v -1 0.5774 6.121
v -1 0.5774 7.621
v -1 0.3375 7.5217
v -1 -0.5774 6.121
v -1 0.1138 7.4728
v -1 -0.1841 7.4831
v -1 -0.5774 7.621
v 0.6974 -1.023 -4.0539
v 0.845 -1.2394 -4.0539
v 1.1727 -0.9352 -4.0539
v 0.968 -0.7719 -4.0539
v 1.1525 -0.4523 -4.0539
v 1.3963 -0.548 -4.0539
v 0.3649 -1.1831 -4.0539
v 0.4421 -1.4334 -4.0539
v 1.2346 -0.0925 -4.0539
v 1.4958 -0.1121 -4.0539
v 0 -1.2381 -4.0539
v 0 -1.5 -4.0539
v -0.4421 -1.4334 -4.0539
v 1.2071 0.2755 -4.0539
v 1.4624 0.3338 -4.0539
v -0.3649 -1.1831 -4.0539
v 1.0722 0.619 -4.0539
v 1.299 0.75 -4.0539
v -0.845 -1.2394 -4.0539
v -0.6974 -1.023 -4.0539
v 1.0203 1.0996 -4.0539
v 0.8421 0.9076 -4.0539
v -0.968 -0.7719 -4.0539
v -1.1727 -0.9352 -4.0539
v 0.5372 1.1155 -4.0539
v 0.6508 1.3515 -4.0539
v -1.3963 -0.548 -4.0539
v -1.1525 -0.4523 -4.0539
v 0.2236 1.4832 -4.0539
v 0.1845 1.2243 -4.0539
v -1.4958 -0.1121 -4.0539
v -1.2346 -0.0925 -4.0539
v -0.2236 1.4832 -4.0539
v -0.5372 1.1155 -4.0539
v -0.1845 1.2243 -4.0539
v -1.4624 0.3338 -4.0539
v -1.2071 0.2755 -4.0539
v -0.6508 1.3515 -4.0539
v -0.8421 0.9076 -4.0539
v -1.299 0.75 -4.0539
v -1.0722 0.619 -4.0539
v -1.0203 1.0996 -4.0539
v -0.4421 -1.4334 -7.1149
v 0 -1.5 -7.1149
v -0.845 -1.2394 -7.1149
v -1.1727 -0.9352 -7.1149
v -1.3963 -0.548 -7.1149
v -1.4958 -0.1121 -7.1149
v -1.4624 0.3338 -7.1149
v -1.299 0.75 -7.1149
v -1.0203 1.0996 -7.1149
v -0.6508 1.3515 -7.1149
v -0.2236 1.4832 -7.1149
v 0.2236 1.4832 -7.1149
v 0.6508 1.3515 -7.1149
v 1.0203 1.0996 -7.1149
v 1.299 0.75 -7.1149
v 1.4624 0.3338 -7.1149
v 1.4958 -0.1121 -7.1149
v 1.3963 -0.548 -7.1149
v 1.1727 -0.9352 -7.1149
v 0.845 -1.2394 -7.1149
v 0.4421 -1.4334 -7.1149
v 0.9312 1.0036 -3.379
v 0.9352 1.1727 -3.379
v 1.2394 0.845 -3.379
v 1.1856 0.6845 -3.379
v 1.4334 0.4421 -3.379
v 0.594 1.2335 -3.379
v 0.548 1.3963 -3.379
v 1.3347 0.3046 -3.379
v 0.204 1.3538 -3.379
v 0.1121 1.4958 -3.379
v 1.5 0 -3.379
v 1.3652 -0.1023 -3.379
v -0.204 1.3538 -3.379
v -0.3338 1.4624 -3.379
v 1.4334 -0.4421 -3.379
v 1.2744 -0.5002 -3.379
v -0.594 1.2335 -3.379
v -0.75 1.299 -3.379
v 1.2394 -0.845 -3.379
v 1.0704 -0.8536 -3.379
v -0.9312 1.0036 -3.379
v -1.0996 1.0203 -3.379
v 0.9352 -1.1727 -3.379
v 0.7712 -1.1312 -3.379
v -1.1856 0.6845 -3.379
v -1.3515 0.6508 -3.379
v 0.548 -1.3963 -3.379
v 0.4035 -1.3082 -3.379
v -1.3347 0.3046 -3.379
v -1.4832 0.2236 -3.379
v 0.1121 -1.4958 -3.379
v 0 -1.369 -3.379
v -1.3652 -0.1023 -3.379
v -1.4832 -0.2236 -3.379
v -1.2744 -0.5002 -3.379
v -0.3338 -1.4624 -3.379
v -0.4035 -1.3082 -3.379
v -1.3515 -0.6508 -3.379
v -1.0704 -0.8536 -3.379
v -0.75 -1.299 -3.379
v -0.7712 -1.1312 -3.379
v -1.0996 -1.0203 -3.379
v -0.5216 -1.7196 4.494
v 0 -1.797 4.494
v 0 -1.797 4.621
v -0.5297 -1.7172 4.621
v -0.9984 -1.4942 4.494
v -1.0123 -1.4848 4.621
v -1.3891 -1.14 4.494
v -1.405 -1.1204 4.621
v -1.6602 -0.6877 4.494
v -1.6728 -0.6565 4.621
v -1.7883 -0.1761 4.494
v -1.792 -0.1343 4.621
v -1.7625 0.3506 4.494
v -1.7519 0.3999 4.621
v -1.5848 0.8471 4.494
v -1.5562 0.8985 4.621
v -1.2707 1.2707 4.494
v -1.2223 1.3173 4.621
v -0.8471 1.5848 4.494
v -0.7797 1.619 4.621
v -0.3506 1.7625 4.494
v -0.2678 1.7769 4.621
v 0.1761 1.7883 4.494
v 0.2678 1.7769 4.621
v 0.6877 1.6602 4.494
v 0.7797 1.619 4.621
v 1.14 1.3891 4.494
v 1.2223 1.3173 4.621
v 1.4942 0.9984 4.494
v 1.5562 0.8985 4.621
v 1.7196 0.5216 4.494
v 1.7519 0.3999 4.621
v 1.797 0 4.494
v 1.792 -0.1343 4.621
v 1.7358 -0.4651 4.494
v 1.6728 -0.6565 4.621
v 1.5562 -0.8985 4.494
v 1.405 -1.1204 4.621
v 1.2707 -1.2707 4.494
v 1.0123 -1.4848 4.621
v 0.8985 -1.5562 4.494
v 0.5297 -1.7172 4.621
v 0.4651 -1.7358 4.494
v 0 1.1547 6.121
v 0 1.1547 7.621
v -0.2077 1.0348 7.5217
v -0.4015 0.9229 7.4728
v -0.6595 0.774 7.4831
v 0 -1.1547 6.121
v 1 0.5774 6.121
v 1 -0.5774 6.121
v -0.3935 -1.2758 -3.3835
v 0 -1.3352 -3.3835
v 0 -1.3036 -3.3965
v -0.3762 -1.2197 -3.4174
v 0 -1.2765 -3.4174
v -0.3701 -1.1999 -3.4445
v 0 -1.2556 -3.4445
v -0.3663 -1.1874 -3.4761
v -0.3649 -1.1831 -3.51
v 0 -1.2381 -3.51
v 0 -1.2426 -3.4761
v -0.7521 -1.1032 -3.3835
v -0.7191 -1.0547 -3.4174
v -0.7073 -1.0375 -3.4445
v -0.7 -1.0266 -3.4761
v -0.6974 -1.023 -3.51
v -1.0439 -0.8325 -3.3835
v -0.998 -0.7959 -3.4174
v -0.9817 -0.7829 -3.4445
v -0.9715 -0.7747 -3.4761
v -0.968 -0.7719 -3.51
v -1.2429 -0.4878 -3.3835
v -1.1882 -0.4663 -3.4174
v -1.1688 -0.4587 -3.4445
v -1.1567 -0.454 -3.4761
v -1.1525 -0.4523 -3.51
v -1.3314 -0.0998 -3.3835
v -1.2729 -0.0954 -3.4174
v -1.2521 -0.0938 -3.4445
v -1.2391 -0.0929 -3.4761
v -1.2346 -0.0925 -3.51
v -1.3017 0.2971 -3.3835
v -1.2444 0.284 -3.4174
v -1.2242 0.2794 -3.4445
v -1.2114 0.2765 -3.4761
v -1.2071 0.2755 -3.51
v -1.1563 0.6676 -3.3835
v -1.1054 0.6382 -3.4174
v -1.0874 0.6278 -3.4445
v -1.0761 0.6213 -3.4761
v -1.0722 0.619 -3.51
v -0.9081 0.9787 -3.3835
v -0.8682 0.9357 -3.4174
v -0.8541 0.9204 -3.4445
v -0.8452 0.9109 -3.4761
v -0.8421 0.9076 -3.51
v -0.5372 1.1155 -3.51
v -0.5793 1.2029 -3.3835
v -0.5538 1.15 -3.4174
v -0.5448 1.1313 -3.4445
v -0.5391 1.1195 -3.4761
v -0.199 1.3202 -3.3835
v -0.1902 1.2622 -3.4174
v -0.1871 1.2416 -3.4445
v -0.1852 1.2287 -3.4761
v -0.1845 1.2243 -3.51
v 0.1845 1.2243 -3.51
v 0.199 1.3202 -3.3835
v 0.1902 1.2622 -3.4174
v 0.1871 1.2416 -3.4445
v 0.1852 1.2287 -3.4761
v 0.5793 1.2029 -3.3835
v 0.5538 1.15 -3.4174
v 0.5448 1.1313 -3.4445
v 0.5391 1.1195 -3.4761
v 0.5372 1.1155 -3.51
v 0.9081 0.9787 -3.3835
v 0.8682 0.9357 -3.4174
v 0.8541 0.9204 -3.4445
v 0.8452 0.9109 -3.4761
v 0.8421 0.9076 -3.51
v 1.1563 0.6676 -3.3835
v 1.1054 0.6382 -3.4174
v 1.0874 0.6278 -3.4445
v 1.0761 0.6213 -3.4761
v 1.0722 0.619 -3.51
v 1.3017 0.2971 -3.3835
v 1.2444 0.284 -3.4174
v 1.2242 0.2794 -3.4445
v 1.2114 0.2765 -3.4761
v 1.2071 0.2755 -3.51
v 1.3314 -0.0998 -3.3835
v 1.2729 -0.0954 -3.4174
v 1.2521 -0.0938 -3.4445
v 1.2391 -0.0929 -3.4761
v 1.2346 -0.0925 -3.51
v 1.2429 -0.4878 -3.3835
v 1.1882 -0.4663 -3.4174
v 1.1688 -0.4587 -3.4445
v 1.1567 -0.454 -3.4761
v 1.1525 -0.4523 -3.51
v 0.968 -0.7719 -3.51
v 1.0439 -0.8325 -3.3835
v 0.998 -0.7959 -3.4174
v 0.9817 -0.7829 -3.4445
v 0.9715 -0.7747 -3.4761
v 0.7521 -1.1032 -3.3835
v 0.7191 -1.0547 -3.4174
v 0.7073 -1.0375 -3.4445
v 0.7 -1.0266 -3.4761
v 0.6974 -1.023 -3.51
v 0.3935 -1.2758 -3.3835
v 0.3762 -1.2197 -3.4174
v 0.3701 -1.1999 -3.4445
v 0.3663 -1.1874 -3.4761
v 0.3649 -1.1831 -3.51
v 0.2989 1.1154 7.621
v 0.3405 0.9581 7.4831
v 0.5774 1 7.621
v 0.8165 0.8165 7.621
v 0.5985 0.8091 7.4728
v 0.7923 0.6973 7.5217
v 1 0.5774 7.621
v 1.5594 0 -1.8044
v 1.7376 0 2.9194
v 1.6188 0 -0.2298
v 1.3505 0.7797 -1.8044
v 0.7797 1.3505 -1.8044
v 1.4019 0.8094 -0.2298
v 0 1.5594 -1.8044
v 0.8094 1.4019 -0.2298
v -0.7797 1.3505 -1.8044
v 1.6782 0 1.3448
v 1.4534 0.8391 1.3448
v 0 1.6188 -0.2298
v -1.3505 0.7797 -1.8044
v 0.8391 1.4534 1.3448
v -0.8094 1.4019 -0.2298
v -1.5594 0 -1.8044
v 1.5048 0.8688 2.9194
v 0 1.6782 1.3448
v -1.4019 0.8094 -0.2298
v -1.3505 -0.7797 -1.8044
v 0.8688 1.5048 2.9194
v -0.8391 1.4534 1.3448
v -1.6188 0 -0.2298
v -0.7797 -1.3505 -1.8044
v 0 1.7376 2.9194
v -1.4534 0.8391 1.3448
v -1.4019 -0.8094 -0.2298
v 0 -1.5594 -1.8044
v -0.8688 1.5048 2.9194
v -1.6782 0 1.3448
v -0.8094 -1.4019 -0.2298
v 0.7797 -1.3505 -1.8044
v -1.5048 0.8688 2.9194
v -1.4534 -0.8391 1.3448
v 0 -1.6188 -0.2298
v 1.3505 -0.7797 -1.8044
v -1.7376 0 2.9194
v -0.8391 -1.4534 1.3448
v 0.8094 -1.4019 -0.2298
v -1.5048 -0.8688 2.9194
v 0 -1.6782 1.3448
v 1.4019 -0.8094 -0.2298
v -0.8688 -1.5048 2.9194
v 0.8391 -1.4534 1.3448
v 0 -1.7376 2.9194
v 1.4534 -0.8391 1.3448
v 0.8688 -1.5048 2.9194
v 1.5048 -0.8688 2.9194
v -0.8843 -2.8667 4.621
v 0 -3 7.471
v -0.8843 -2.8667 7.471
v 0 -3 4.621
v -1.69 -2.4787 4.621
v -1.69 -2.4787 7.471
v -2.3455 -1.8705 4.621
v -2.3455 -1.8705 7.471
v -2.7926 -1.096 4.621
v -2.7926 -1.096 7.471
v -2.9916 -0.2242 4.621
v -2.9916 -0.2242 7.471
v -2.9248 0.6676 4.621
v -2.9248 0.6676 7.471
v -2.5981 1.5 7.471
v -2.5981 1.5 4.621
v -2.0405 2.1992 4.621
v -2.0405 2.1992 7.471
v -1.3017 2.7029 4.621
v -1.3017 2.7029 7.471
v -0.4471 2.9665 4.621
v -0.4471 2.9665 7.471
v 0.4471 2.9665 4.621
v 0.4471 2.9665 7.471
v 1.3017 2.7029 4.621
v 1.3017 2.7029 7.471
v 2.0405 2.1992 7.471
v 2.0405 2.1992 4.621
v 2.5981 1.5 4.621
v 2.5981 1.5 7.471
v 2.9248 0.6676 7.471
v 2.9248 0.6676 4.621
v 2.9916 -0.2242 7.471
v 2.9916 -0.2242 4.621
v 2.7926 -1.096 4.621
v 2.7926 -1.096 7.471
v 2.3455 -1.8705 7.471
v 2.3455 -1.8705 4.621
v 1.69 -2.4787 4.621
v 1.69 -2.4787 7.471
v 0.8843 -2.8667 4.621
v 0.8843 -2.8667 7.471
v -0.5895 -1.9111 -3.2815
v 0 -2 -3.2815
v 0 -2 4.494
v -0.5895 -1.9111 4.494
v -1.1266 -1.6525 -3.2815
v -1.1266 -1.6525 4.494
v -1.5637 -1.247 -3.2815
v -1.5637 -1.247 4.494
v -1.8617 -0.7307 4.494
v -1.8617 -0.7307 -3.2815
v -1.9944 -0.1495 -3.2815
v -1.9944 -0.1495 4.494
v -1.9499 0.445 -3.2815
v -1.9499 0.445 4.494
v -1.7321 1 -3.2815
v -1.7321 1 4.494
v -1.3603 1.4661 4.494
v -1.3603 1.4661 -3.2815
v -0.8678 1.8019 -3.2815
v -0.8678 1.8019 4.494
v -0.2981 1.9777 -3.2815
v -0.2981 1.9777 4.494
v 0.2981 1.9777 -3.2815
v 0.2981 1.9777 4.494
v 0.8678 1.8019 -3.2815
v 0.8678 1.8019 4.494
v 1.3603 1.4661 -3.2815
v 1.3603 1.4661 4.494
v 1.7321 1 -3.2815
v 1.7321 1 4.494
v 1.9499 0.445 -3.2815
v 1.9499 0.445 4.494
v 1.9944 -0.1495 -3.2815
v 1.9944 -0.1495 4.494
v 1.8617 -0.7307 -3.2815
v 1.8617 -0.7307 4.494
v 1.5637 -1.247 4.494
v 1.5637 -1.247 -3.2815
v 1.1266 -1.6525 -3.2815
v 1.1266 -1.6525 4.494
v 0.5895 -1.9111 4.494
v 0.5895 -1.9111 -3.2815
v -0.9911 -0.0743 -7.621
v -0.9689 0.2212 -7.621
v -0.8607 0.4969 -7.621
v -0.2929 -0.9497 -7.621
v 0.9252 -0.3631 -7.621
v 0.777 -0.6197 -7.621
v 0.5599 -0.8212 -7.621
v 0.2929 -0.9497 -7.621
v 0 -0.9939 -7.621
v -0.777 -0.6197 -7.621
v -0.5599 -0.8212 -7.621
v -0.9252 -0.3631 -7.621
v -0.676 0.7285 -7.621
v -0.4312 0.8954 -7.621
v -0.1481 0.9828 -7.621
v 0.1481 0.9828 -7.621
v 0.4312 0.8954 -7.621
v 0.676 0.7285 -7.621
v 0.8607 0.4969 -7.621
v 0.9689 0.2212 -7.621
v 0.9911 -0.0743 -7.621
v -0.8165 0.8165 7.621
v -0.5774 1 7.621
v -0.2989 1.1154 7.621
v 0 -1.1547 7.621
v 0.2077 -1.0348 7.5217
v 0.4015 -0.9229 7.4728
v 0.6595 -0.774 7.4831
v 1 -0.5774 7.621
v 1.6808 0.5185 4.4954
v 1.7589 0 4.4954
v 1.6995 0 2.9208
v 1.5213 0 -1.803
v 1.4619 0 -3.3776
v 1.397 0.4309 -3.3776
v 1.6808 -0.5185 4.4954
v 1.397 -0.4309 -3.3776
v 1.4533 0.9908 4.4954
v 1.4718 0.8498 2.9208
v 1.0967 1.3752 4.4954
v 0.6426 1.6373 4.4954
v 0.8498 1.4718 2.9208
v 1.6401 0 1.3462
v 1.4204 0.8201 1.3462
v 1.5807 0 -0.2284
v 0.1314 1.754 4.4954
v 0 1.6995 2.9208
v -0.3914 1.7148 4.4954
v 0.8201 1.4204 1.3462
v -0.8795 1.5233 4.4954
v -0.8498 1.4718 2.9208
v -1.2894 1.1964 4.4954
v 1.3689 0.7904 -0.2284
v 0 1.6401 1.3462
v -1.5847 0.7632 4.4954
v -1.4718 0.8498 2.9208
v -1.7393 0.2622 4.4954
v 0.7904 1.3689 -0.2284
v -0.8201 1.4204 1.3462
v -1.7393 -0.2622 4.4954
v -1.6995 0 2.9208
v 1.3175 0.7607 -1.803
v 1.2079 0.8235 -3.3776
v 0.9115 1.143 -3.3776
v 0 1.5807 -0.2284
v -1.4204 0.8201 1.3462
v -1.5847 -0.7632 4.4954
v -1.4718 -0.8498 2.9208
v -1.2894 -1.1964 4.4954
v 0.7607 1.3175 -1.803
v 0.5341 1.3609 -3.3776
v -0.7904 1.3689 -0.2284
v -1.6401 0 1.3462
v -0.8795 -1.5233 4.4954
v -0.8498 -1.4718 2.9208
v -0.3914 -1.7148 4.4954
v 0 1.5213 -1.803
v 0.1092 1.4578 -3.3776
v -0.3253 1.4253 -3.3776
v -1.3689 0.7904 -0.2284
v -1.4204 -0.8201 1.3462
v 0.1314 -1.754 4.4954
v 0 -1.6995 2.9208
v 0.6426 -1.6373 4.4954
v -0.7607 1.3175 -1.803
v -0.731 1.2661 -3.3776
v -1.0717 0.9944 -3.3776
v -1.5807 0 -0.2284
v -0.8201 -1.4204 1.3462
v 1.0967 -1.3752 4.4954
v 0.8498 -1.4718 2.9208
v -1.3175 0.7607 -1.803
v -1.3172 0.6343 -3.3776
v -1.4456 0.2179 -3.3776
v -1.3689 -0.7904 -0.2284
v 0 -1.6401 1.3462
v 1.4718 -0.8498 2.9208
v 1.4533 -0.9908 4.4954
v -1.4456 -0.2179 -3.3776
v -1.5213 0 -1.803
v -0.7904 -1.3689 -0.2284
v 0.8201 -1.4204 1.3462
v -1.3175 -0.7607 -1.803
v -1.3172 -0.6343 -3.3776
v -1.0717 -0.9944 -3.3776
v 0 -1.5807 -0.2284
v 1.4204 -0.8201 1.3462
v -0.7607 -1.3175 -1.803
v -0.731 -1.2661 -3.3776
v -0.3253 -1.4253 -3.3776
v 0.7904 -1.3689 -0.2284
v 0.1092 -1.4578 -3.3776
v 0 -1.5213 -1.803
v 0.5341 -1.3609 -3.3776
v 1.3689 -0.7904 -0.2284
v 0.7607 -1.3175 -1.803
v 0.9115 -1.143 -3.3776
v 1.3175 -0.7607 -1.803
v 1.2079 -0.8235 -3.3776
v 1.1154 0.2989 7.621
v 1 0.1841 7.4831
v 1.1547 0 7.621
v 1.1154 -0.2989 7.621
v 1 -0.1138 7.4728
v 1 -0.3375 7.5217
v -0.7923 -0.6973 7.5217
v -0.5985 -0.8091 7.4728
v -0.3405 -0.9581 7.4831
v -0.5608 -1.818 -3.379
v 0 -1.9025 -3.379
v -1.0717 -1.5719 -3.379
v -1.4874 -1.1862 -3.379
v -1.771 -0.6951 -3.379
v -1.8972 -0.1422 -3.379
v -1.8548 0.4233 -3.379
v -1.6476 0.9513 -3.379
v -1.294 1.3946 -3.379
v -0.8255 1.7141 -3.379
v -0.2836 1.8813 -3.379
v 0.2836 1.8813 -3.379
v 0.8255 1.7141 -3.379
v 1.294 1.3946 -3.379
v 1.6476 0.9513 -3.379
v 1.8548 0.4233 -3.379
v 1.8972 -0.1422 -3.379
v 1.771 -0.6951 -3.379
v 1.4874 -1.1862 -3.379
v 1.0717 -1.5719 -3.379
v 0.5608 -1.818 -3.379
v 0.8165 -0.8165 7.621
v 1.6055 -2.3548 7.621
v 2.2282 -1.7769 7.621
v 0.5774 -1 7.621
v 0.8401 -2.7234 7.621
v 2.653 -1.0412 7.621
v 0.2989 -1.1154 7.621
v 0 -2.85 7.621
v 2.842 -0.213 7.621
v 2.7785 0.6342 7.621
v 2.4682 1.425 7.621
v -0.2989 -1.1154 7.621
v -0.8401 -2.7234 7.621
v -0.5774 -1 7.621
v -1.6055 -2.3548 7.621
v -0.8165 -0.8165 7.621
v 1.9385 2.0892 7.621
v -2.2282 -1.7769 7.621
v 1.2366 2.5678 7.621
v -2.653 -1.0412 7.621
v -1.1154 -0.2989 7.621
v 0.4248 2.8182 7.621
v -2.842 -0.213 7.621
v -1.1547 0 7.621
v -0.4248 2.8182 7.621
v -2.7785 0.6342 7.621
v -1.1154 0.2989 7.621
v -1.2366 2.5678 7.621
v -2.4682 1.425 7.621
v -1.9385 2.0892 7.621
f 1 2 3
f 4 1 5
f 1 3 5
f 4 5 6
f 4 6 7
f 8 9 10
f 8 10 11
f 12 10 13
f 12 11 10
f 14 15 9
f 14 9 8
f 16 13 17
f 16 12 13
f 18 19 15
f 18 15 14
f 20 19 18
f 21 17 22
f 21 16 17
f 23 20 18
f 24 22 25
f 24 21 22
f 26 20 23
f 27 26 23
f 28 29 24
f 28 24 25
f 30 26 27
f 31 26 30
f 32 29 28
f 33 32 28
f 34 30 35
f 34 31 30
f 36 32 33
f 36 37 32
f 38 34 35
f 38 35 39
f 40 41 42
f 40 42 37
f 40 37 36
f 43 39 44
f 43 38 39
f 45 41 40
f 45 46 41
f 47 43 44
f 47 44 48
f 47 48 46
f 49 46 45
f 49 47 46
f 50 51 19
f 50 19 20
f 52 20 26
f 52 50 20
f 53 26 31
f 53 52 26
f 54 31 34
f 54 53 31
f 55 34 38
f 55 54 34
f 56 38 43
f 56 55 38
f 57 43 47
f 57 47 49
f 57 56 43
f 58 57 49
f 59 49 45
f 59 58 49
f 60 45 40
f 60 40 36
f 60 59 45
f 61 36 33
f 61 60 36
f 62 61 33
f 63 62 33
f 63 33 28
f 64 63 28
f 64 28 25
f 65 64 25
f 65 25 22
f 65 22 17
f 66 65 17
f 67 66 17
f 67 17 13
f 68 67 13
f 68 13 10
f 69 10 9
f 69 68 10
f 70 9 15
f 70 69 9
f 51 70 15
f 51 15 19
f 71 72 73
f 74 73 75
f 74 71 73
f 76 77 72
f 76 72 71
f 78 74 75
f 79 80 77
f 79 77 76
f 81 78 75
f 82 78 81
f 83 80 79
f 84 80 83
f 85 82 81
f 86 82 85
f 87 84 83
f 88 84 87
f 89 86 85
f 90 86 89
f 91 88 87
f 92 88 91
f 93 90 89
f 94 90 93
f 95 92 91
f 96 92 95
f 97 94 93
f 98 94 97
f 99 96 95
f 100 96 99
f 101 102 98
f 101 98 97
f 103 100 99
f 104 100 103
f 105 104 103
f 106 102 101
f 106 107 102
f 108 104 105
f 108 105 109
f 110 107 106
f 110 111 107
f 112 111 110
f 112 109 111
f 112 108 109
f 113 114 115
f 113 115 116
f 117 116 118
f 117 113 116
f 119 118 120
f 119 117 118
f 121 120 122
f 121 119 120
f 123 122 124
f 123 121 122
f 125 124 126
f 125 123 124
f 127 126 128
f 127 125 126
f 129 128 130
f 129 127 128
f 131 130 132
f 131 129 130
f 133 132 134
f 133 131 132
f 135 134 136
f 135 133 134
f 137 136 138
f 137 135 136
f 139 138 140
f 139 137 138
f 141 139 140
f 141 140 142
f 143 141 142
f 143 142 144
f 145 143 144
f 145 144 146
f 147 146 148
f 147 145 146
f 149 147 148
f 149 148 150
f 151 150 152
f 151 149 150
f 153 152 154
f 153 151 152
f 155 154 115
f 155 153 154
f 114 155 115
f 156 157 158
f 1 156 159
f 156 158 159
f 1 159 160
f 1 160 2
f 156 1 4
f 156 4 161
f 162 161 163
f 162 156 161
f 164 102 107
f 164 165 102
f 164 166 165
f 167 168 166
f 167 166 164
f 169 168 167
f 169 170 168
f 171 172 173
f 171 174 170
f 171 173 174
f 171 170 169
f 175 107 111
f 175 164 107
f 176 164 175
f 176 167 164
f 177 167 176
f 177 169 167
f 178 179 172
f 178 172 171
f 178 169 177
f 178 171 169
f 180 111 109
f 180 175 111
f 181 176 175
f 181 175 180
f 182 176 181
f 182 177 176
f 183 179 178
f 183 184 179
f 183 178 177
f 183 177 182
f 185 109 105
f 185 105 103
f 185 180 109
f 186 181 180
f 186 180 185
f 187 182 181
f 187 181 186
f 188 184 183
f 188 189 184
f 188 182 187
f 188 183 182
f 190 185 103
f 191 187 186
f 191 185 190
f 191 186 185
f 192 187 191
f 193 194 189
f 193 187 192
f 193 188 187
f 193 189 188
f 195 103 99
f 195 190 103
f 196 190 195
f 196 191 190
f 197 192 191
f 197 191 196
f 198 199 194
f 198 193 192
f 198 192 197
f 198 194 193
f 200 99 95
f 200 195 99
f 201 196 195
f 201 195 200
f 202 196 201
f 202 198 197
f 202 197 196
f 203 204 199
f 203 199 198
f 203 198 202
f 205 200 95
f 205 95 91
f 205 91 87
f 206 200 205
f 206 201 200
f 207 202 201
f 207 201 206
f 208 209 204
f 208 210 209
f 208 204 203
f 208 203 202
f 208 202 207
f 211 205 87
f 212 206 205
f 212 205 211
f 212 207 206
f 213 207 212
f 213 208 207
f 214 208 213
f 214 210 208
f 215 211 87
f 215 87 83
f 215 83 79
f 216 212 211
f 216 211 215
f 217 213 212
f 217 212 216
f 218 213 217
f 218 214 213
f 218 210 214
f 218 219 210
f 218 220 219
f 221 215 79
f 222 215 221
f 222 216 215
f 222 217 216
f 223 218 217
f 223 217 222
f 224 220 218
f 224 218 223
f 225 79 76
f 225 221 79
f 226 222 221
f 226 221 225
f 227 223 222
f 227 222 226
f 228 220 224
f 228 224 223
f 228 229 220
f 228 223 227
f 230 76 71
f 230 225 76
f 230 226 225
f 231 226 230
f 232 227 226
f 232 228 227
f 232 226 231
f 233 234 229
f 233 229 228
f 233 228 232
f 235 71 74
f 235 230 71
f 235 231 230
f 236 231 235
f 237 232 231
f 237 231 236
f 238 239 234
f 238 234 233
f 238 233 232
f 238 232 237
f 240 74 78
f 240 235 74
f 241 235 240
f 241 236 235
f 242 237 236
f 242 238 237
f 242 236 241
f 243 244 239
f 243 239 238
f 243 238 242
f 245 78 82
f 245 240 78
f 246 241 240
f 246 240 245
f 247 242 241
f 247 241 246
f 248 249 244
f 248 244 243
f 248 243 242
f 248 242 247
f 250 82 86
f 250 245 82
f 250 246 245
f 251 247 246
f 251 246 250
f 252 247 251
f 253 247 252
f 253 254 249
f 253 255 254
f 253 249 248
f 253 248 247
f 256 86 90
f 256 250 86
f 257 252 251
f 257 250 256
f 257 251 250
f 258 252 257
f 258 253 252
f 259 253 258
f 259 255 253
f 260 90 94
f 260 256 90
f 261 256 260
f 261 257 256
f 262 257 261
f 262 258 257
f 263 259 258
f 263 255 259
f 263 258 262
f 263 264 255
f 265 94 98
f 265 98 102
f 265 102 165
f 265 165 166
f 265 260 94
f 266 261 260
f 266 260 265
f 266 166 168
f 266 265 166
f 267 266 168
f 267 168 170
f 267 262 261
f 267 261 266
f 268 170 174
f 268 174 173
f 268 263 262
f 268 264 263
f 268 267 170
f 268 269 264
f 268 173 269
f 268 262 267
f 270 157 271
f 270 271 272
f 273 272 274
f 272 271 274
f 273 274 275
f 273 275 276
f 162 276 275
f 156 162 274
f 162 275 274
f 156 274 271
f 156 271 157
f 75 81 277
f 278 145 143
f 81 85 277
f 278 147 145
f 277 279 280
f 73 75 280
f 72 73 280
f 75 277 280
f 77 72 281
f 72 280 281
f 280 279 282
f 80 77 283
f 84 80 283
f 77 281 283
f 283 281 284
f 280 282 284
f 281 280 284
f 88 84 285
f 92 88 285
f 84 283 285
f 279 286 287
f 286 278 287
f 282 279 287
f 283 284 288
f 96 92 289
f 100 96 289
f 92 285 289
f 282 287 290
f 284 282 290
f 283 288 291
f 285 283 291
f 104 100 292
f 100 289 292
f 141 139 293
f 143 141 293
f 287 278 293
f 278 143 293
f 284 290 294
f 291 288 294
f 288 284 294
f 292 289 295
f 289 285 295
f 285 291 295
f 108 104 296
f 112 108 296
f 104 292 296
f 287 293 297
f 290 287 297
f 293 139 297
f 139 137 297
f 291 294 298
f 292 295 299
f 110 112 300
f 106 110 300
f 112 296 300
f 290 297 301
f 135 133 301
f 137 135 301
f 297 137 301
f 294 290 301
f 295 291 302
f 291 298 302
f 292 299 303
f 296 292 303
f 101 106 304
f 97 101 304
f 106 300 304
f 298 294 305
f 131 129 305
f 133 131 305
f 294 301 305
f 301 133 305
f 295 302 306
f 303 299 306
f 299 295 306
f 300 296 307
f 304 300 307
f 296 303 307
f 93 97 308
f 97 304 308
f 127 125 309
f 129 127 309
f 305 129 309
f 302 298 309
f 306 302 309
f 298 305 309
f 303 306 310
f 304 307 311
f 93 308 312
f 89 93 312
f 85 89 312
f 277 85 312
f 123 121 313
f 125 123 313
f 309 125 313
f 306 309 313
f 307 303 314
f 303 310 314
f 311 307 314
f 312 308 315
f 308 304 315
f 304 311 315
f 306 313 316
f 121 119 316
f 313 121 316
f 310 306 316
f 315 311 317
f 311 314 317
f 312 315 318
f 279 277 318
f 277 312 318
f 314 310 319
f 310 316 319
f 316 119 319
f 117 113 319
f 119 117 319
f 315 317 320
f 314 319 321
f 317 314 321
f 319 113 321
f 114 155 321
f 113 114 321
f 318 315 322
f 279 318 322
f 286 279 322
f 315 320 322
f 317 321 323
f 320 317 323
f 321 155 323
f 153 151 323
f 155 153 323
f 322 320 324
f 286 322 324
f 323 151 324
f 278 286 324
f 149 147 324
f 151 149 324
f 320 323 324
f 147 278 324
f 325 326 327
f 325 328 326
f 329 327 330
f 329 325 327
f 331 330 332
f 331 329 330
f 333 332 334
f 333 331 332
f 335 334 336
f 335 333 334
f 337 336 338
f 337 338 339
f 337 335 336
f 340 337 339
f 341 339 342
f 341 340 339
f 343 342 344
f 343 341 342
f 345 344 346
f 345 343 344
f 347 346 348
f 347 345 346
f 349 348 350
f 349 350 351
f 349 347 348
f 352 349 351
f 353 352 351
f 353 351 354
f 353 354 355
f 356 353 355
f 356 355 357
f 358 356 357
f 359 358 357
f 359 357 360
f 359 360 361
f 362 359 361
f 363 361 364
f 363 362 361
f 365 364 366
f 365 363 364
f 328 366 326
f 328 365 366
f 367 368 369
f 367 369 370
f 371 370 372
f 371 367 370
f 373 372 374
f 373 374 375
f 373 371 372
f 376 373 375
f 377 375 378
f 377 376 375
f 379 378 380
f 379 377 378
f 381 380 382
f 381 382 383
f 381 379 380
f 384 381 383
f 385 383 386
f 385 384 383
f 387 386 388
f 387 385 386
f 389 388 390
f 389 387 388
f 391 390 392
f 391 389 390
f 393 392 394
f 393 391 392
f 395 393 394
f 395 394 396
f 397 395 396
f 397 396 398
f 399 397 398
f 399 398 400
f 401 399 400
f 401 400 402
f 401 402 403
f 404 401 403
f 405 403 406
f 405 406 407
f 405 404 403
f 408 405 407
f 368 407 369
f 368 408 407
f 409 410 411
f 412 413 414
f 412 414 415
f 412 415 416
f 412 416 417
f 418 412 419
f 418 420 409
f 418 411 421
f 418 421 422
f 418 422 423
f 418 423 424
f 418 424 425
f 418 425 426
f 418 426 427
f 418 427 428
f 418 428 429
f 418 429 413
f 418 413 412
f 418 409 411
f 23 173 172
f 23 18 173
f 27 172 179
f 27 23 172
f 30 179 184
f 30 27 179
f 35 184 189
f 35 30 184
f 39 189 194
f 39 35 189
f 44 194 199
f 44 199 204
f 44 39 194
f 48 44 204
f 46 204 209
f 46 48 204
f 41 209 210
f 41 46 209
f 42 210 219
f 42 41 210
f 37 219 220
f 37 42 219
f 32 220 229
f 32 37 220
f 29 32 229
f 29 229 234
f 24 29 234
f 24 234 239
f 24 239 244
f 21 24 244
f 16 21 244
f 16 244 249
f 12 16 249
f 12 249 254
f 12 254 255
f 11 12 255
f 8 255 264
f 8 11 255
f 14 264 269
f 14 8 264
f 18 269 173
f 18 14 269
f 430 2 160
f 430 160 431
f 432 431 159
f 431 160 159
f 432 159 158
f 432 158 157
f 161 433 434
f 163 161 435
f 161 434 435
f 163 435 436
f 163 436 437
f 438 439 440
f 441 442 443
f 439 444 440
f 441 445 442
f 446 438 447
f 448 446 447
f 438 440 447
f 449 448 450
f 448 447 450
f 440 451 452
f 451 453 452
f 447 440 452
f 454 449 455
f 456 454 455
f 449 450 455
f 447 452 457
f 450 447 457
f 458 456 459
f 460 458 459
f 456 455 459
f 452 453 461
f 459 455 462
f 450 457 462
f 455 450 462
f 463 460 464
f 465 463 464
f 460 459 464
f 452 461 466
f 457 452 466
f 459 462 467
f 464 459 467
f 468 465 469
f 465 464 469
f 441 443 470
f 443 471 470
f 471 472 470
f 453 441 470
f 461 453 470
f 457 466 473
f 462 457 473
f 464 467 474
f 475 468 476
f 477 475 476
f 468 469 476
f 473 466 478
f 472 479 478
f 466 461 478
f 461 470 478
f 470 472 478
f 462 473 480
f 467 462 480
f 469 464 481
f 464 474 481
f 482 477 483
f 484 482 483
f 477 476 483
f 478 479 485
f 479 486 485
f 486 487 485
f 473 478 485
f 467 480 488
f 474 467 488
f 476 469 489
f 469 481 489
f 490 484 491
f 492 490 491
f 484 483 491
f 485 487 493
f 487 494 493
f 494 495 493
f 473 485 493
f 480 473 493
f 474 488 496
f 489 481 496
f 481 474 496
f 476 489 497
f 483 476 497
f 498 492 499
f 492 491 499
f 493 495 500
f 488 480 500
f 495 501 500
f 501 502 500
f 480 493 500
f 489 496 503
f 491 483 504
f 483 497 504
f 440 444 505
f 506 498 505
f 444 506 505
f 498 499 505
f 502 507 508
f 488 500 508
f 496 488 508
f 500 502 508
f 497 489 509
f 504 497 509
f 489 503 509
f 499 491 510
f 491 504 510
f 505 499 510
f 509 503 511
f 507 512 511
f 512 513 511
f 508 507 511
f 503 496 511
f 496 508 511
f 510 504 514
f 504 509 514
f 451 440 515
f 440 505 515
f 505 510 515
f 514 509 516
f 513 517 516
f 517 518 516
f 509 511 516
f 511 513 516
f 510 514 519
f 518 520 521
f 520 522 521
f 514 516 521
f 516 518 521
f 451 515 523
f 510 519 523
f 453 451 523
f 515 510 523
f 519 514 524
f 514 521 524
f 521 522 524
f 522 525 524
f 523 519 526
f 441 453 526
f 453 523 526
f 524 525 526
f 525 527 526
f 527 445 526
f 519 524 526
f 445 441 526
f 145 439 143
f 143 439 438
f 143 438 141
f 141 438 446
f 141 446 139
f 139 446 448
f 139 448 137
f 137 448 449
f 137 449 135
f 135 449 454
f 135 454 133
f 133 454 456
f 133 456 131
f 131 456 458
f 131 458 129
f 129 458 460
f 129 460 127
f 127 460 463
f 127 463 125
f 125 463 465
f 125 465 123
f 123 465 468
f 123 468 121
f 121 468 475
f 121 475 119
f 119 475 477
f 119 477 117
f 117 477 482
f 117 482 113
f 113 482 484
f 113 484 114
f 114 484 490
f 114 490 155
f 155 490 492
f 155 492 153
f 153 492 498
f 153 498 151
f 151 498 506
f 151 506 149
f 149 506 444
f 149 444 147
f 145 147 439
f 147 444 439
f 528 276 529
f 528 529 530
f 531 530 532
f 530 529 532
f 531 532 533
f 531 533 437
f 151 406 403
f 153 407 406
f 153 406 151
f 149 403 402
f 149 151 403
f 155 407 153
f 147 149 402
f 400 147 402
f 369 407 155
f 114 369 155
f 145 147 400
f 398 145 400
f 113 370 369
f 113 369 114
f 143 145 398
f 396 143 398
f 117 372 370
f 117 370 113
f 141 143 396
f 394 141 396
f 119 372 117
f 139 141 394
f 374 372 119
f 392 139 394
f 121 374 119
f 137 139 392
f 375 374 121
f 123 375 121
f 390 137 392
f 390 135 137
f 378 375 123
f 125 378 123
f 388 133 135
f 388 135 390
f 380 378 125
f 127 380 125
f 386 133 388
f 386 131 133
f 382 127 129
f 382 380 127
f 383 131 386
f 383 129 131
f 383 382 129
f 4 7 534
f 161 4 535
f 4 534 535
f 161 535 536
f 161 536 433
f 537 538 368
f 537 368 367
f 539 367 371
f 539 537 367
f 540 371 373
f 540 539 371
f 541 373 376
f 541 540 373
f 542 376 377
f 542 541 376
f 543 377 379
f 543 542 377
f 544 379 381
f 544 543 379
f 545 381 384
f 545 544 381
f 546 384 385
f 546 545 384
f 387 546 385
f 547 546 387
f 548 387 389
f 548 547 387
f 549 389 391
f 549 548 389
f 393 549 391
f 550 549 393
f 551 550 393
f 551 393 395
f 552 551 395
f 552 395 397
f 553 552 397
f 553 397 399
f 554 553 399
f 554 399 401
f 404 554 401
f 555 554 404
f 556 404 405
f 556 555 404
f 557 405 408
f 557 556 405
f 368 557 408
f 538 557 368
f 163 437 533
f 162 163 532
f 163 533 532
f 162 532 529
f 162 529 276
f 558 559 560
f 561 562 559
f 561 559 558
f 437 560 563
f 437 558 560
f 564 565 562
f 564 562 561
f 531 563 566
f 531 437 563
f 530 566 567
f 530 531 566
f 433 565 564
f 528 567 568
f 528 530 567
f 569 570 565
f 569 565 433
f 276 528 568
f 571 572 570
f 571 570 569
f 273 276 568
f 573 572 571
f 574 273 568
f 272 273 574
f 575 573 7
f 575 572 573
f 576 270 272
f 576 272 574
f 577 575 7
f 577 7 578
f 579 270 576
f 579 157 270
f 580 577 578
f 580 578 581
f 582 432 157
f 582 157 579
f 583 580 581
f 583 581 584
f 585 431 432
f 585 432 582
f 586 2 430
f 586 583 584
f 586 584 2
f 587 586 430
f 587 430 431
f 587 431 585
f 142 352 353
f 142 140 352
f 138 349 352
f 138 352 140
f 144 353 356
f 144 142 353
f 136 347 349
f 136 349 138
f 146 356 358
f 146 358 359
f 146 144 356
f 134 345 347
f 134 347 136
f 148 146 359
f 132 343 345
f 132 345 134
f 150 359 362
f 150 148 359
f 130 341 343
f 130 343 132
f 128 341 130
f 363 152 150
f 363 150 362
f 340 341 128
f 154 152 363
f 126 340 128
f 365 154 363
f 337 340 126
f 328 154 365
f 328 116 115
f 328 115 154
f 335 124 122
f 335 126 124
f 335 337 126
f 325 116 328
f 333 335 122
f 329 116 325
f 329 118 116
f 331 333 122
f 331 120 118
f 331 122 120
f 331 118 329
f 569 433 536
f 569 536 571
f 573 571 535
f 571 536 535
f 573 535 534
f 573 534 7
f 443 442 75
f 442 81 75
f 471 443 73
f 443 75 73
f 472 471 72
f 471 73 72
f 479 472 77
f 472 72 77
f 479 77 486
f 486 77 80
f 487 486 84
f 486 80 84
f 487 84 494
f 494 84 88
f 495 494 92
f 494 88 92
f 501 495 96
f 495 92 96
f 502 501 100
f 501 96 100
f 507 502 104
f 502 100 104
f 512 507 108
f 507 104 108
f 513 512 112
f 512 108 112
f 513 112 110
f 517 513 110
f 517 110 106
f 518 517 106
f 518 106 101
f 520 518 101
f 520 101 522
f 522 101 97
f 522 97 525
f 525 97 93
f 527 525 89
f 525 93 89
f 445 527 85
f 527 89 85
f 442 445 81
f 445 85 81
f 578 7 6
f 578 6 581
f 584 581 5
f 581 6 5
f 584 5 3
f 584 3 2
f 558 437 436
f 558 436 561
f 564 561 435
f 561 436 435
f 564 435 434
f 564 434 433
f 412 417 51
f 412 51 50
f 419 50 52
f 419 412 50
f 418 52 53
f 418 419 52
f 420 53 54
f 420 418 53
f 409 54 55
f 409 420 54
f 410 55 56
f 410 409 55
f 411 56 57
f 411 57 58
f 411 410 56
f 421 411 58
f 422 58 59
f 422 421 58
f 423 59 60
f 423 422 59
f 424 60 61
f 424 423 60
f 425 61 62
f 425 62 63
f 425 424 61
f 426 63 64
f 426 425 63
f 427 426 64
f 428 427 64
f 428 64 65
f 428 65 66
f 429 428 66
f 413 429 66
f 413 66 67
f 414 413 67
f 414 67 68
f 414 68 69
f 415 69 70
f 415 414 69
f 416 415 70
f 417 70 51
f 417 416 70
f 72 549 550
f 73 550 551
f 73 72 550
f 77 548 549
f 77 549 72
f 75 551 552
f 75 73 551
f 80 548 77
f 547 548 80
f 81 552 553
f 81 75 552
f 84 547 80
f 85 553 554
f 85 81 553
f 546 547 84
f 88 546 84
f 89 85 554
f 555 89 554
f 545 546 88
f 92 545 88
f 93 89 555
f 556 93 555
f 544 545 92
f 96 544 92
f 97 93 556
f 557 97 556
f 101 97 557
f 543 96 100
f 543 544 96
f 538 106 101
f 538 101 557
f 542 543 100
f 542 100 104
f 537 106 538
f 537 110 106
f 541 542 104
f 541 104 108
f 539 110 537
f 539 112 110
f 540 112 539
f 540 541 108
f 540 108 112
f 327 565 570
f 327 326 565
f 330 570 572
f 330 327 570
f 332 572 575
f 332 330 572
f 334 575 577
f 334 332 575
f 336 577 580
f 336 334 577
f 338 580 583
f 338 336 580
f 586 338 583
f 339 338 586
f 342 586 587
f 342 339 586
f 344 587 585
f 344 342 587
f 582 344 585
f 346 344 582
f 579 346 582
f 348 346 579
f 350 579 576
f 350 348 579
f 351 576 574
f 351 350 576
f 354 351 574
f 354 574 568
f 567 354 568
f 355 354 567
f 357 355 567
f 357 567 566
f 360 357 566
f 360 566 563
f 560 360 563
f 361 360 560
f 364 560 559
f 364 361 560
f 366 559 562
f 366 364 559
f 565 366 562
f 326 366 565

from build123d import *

# Parameters (mm, degrees)
CUT_EXTRUDE1_START = 7.621
CUT_EXTRUDE1_DEPTH = 1.5
CHAMFER1_SIZE      = 0.0975
CHAMFER2_SIZE      = 0.506148016


# Read off the part's stored shape, not the designer's step: Cut-Revolve-Thin1
with BuildPart() as part:
    # Sketch3 → Revolve1 (revolve)
    with BuildSketch(Plane(origin=(0, 0, 0), x_dir=(0, 0, -1), z_dir=(1, 0, 0)), mode=Mode.PRIVATE) as revolve1_sk:
        with BuildLine():
            Line((-7.621, 0), (-7.621, 2.805))
            Line((-7.621, 2.805), (-7.621, 3))
            Line((-7.621, 3), (-4.816, 3))
            Line((-4.816, 3), (-4.621, 3))
            Line((-4.621, 3), (-4.621, 1.797))
            Line((-4.621, 1.797), (-4.494, 1.797))
            Line((-4.494, 1.797), (-4.494, 2))
            Line((-4.494, 2), (3.379, 2))
            Line((3.379, 2), (3.379, 1.36904775))
            ThreePointArc((3.379, 1.36904775), (3.417355026, 1.276450526), (3.50995225, 1.2380955))
            Line((3.50995225, 1.2380955), (4.053864022, 1.2380955))
            Line((4.053864022, 1.2380955), (4.053864022, 1.5))
            Line((4.053864022, 1.5), (7.246, 1.5))
            Line((7.246, 1.5), (7.621, 1.5))
            Line((7.621, 1.5), (7.621, 0))
            Line((7.621, 0), (-7.621, 0))
        make_face()
    revolve(revolve1_sk.sketch.rotate(Axis((0, 0, 7.621), (0, 0, -1)), 180), axis=Axis((0, 0, 7.621), (0, 0, -1)))

    # Cut-Revolve-Thin1 outline → Cut-Revolve-Thin1 (revolve, cut)
    with BuildSketch(Plane.XZ):
        Polygon((1.758927081, 4.495436258), (1.461927081, -3.377563742), (1.5, -3.379), (1.797, 4.494), align=None)
    revolve(axis=Axis((0, 0, 0), (0, 0, 1)), mode=Mode.SUBTRACT)

    # Sketch4 → Cut-Extrude1 (cut)
    with BuildSketch(Plane.XY.offset(CUT_EXTRUDE1_START)):
        Polygon((0, 1.154700538), (-1, 0.577350269), (-1, -0.577350269), (0, -1.154700538), (1, -0.577350269), (1, 0.577350269), align=None)
    extrude(amount=-CUT_EXTRUDE1_DEPTH, mode=Mode.SUBTRACT)

    # Cut-Extrude2 cone 1 section (through the dimple's axis) → Cut-Extrude2 (revolve, cut)
    with BuildSketch(Plane(origin=(0, 0, 7.621), x_dir=(0, -1, 0), z_dir=(1, 0, 0))):
        Polygon((0, 0), (1.154700538, 0), (0, 1.154700538), align=None)
    revolve(axis=Axis((0, 0, 7.621), (0, 0, -1)), mode=Mode.SUBTRACT)

    # Chamfer1
    chamfer1_edges = [part.edges().sort_by_distance(p)[0] for p in [
        (0, 2, -3.379),
    ]]
    chamfer(chamfer1_edges, length=CHAMFER1_SIZE)

    # Chamfer2
    chamfer2_edges = [part.edges().sort_by_distance(p)[0] for p in [
        (0, 1.5, -7.621),
    ]]
    chamfer(chamfer2_edges, length=CHAMFER2_SIZE)

    # Sketch10 → Cut-Revolve2 (revolve, cut)
    with BuildSketch(Plane(origin=(0, 0, 0), x_dir=(0, 0, -1), z_dir=(1, 0, 0)), mode=Mode.PRIVATE) as cut_revolve2_sk:
        Polygon((-7.621, 2.85), (-7.471, 3), (-7.621, 3), align=None)
    revolve(cut_revolve2_sk.sketch.rotate(Axis((0, 0, 7.621), (0, 0, -1)), 180), axis=Axis((0, 0, 7.621), (0, 0, -1)), mode=Mode.SUBTRACT)


solid = part.part
